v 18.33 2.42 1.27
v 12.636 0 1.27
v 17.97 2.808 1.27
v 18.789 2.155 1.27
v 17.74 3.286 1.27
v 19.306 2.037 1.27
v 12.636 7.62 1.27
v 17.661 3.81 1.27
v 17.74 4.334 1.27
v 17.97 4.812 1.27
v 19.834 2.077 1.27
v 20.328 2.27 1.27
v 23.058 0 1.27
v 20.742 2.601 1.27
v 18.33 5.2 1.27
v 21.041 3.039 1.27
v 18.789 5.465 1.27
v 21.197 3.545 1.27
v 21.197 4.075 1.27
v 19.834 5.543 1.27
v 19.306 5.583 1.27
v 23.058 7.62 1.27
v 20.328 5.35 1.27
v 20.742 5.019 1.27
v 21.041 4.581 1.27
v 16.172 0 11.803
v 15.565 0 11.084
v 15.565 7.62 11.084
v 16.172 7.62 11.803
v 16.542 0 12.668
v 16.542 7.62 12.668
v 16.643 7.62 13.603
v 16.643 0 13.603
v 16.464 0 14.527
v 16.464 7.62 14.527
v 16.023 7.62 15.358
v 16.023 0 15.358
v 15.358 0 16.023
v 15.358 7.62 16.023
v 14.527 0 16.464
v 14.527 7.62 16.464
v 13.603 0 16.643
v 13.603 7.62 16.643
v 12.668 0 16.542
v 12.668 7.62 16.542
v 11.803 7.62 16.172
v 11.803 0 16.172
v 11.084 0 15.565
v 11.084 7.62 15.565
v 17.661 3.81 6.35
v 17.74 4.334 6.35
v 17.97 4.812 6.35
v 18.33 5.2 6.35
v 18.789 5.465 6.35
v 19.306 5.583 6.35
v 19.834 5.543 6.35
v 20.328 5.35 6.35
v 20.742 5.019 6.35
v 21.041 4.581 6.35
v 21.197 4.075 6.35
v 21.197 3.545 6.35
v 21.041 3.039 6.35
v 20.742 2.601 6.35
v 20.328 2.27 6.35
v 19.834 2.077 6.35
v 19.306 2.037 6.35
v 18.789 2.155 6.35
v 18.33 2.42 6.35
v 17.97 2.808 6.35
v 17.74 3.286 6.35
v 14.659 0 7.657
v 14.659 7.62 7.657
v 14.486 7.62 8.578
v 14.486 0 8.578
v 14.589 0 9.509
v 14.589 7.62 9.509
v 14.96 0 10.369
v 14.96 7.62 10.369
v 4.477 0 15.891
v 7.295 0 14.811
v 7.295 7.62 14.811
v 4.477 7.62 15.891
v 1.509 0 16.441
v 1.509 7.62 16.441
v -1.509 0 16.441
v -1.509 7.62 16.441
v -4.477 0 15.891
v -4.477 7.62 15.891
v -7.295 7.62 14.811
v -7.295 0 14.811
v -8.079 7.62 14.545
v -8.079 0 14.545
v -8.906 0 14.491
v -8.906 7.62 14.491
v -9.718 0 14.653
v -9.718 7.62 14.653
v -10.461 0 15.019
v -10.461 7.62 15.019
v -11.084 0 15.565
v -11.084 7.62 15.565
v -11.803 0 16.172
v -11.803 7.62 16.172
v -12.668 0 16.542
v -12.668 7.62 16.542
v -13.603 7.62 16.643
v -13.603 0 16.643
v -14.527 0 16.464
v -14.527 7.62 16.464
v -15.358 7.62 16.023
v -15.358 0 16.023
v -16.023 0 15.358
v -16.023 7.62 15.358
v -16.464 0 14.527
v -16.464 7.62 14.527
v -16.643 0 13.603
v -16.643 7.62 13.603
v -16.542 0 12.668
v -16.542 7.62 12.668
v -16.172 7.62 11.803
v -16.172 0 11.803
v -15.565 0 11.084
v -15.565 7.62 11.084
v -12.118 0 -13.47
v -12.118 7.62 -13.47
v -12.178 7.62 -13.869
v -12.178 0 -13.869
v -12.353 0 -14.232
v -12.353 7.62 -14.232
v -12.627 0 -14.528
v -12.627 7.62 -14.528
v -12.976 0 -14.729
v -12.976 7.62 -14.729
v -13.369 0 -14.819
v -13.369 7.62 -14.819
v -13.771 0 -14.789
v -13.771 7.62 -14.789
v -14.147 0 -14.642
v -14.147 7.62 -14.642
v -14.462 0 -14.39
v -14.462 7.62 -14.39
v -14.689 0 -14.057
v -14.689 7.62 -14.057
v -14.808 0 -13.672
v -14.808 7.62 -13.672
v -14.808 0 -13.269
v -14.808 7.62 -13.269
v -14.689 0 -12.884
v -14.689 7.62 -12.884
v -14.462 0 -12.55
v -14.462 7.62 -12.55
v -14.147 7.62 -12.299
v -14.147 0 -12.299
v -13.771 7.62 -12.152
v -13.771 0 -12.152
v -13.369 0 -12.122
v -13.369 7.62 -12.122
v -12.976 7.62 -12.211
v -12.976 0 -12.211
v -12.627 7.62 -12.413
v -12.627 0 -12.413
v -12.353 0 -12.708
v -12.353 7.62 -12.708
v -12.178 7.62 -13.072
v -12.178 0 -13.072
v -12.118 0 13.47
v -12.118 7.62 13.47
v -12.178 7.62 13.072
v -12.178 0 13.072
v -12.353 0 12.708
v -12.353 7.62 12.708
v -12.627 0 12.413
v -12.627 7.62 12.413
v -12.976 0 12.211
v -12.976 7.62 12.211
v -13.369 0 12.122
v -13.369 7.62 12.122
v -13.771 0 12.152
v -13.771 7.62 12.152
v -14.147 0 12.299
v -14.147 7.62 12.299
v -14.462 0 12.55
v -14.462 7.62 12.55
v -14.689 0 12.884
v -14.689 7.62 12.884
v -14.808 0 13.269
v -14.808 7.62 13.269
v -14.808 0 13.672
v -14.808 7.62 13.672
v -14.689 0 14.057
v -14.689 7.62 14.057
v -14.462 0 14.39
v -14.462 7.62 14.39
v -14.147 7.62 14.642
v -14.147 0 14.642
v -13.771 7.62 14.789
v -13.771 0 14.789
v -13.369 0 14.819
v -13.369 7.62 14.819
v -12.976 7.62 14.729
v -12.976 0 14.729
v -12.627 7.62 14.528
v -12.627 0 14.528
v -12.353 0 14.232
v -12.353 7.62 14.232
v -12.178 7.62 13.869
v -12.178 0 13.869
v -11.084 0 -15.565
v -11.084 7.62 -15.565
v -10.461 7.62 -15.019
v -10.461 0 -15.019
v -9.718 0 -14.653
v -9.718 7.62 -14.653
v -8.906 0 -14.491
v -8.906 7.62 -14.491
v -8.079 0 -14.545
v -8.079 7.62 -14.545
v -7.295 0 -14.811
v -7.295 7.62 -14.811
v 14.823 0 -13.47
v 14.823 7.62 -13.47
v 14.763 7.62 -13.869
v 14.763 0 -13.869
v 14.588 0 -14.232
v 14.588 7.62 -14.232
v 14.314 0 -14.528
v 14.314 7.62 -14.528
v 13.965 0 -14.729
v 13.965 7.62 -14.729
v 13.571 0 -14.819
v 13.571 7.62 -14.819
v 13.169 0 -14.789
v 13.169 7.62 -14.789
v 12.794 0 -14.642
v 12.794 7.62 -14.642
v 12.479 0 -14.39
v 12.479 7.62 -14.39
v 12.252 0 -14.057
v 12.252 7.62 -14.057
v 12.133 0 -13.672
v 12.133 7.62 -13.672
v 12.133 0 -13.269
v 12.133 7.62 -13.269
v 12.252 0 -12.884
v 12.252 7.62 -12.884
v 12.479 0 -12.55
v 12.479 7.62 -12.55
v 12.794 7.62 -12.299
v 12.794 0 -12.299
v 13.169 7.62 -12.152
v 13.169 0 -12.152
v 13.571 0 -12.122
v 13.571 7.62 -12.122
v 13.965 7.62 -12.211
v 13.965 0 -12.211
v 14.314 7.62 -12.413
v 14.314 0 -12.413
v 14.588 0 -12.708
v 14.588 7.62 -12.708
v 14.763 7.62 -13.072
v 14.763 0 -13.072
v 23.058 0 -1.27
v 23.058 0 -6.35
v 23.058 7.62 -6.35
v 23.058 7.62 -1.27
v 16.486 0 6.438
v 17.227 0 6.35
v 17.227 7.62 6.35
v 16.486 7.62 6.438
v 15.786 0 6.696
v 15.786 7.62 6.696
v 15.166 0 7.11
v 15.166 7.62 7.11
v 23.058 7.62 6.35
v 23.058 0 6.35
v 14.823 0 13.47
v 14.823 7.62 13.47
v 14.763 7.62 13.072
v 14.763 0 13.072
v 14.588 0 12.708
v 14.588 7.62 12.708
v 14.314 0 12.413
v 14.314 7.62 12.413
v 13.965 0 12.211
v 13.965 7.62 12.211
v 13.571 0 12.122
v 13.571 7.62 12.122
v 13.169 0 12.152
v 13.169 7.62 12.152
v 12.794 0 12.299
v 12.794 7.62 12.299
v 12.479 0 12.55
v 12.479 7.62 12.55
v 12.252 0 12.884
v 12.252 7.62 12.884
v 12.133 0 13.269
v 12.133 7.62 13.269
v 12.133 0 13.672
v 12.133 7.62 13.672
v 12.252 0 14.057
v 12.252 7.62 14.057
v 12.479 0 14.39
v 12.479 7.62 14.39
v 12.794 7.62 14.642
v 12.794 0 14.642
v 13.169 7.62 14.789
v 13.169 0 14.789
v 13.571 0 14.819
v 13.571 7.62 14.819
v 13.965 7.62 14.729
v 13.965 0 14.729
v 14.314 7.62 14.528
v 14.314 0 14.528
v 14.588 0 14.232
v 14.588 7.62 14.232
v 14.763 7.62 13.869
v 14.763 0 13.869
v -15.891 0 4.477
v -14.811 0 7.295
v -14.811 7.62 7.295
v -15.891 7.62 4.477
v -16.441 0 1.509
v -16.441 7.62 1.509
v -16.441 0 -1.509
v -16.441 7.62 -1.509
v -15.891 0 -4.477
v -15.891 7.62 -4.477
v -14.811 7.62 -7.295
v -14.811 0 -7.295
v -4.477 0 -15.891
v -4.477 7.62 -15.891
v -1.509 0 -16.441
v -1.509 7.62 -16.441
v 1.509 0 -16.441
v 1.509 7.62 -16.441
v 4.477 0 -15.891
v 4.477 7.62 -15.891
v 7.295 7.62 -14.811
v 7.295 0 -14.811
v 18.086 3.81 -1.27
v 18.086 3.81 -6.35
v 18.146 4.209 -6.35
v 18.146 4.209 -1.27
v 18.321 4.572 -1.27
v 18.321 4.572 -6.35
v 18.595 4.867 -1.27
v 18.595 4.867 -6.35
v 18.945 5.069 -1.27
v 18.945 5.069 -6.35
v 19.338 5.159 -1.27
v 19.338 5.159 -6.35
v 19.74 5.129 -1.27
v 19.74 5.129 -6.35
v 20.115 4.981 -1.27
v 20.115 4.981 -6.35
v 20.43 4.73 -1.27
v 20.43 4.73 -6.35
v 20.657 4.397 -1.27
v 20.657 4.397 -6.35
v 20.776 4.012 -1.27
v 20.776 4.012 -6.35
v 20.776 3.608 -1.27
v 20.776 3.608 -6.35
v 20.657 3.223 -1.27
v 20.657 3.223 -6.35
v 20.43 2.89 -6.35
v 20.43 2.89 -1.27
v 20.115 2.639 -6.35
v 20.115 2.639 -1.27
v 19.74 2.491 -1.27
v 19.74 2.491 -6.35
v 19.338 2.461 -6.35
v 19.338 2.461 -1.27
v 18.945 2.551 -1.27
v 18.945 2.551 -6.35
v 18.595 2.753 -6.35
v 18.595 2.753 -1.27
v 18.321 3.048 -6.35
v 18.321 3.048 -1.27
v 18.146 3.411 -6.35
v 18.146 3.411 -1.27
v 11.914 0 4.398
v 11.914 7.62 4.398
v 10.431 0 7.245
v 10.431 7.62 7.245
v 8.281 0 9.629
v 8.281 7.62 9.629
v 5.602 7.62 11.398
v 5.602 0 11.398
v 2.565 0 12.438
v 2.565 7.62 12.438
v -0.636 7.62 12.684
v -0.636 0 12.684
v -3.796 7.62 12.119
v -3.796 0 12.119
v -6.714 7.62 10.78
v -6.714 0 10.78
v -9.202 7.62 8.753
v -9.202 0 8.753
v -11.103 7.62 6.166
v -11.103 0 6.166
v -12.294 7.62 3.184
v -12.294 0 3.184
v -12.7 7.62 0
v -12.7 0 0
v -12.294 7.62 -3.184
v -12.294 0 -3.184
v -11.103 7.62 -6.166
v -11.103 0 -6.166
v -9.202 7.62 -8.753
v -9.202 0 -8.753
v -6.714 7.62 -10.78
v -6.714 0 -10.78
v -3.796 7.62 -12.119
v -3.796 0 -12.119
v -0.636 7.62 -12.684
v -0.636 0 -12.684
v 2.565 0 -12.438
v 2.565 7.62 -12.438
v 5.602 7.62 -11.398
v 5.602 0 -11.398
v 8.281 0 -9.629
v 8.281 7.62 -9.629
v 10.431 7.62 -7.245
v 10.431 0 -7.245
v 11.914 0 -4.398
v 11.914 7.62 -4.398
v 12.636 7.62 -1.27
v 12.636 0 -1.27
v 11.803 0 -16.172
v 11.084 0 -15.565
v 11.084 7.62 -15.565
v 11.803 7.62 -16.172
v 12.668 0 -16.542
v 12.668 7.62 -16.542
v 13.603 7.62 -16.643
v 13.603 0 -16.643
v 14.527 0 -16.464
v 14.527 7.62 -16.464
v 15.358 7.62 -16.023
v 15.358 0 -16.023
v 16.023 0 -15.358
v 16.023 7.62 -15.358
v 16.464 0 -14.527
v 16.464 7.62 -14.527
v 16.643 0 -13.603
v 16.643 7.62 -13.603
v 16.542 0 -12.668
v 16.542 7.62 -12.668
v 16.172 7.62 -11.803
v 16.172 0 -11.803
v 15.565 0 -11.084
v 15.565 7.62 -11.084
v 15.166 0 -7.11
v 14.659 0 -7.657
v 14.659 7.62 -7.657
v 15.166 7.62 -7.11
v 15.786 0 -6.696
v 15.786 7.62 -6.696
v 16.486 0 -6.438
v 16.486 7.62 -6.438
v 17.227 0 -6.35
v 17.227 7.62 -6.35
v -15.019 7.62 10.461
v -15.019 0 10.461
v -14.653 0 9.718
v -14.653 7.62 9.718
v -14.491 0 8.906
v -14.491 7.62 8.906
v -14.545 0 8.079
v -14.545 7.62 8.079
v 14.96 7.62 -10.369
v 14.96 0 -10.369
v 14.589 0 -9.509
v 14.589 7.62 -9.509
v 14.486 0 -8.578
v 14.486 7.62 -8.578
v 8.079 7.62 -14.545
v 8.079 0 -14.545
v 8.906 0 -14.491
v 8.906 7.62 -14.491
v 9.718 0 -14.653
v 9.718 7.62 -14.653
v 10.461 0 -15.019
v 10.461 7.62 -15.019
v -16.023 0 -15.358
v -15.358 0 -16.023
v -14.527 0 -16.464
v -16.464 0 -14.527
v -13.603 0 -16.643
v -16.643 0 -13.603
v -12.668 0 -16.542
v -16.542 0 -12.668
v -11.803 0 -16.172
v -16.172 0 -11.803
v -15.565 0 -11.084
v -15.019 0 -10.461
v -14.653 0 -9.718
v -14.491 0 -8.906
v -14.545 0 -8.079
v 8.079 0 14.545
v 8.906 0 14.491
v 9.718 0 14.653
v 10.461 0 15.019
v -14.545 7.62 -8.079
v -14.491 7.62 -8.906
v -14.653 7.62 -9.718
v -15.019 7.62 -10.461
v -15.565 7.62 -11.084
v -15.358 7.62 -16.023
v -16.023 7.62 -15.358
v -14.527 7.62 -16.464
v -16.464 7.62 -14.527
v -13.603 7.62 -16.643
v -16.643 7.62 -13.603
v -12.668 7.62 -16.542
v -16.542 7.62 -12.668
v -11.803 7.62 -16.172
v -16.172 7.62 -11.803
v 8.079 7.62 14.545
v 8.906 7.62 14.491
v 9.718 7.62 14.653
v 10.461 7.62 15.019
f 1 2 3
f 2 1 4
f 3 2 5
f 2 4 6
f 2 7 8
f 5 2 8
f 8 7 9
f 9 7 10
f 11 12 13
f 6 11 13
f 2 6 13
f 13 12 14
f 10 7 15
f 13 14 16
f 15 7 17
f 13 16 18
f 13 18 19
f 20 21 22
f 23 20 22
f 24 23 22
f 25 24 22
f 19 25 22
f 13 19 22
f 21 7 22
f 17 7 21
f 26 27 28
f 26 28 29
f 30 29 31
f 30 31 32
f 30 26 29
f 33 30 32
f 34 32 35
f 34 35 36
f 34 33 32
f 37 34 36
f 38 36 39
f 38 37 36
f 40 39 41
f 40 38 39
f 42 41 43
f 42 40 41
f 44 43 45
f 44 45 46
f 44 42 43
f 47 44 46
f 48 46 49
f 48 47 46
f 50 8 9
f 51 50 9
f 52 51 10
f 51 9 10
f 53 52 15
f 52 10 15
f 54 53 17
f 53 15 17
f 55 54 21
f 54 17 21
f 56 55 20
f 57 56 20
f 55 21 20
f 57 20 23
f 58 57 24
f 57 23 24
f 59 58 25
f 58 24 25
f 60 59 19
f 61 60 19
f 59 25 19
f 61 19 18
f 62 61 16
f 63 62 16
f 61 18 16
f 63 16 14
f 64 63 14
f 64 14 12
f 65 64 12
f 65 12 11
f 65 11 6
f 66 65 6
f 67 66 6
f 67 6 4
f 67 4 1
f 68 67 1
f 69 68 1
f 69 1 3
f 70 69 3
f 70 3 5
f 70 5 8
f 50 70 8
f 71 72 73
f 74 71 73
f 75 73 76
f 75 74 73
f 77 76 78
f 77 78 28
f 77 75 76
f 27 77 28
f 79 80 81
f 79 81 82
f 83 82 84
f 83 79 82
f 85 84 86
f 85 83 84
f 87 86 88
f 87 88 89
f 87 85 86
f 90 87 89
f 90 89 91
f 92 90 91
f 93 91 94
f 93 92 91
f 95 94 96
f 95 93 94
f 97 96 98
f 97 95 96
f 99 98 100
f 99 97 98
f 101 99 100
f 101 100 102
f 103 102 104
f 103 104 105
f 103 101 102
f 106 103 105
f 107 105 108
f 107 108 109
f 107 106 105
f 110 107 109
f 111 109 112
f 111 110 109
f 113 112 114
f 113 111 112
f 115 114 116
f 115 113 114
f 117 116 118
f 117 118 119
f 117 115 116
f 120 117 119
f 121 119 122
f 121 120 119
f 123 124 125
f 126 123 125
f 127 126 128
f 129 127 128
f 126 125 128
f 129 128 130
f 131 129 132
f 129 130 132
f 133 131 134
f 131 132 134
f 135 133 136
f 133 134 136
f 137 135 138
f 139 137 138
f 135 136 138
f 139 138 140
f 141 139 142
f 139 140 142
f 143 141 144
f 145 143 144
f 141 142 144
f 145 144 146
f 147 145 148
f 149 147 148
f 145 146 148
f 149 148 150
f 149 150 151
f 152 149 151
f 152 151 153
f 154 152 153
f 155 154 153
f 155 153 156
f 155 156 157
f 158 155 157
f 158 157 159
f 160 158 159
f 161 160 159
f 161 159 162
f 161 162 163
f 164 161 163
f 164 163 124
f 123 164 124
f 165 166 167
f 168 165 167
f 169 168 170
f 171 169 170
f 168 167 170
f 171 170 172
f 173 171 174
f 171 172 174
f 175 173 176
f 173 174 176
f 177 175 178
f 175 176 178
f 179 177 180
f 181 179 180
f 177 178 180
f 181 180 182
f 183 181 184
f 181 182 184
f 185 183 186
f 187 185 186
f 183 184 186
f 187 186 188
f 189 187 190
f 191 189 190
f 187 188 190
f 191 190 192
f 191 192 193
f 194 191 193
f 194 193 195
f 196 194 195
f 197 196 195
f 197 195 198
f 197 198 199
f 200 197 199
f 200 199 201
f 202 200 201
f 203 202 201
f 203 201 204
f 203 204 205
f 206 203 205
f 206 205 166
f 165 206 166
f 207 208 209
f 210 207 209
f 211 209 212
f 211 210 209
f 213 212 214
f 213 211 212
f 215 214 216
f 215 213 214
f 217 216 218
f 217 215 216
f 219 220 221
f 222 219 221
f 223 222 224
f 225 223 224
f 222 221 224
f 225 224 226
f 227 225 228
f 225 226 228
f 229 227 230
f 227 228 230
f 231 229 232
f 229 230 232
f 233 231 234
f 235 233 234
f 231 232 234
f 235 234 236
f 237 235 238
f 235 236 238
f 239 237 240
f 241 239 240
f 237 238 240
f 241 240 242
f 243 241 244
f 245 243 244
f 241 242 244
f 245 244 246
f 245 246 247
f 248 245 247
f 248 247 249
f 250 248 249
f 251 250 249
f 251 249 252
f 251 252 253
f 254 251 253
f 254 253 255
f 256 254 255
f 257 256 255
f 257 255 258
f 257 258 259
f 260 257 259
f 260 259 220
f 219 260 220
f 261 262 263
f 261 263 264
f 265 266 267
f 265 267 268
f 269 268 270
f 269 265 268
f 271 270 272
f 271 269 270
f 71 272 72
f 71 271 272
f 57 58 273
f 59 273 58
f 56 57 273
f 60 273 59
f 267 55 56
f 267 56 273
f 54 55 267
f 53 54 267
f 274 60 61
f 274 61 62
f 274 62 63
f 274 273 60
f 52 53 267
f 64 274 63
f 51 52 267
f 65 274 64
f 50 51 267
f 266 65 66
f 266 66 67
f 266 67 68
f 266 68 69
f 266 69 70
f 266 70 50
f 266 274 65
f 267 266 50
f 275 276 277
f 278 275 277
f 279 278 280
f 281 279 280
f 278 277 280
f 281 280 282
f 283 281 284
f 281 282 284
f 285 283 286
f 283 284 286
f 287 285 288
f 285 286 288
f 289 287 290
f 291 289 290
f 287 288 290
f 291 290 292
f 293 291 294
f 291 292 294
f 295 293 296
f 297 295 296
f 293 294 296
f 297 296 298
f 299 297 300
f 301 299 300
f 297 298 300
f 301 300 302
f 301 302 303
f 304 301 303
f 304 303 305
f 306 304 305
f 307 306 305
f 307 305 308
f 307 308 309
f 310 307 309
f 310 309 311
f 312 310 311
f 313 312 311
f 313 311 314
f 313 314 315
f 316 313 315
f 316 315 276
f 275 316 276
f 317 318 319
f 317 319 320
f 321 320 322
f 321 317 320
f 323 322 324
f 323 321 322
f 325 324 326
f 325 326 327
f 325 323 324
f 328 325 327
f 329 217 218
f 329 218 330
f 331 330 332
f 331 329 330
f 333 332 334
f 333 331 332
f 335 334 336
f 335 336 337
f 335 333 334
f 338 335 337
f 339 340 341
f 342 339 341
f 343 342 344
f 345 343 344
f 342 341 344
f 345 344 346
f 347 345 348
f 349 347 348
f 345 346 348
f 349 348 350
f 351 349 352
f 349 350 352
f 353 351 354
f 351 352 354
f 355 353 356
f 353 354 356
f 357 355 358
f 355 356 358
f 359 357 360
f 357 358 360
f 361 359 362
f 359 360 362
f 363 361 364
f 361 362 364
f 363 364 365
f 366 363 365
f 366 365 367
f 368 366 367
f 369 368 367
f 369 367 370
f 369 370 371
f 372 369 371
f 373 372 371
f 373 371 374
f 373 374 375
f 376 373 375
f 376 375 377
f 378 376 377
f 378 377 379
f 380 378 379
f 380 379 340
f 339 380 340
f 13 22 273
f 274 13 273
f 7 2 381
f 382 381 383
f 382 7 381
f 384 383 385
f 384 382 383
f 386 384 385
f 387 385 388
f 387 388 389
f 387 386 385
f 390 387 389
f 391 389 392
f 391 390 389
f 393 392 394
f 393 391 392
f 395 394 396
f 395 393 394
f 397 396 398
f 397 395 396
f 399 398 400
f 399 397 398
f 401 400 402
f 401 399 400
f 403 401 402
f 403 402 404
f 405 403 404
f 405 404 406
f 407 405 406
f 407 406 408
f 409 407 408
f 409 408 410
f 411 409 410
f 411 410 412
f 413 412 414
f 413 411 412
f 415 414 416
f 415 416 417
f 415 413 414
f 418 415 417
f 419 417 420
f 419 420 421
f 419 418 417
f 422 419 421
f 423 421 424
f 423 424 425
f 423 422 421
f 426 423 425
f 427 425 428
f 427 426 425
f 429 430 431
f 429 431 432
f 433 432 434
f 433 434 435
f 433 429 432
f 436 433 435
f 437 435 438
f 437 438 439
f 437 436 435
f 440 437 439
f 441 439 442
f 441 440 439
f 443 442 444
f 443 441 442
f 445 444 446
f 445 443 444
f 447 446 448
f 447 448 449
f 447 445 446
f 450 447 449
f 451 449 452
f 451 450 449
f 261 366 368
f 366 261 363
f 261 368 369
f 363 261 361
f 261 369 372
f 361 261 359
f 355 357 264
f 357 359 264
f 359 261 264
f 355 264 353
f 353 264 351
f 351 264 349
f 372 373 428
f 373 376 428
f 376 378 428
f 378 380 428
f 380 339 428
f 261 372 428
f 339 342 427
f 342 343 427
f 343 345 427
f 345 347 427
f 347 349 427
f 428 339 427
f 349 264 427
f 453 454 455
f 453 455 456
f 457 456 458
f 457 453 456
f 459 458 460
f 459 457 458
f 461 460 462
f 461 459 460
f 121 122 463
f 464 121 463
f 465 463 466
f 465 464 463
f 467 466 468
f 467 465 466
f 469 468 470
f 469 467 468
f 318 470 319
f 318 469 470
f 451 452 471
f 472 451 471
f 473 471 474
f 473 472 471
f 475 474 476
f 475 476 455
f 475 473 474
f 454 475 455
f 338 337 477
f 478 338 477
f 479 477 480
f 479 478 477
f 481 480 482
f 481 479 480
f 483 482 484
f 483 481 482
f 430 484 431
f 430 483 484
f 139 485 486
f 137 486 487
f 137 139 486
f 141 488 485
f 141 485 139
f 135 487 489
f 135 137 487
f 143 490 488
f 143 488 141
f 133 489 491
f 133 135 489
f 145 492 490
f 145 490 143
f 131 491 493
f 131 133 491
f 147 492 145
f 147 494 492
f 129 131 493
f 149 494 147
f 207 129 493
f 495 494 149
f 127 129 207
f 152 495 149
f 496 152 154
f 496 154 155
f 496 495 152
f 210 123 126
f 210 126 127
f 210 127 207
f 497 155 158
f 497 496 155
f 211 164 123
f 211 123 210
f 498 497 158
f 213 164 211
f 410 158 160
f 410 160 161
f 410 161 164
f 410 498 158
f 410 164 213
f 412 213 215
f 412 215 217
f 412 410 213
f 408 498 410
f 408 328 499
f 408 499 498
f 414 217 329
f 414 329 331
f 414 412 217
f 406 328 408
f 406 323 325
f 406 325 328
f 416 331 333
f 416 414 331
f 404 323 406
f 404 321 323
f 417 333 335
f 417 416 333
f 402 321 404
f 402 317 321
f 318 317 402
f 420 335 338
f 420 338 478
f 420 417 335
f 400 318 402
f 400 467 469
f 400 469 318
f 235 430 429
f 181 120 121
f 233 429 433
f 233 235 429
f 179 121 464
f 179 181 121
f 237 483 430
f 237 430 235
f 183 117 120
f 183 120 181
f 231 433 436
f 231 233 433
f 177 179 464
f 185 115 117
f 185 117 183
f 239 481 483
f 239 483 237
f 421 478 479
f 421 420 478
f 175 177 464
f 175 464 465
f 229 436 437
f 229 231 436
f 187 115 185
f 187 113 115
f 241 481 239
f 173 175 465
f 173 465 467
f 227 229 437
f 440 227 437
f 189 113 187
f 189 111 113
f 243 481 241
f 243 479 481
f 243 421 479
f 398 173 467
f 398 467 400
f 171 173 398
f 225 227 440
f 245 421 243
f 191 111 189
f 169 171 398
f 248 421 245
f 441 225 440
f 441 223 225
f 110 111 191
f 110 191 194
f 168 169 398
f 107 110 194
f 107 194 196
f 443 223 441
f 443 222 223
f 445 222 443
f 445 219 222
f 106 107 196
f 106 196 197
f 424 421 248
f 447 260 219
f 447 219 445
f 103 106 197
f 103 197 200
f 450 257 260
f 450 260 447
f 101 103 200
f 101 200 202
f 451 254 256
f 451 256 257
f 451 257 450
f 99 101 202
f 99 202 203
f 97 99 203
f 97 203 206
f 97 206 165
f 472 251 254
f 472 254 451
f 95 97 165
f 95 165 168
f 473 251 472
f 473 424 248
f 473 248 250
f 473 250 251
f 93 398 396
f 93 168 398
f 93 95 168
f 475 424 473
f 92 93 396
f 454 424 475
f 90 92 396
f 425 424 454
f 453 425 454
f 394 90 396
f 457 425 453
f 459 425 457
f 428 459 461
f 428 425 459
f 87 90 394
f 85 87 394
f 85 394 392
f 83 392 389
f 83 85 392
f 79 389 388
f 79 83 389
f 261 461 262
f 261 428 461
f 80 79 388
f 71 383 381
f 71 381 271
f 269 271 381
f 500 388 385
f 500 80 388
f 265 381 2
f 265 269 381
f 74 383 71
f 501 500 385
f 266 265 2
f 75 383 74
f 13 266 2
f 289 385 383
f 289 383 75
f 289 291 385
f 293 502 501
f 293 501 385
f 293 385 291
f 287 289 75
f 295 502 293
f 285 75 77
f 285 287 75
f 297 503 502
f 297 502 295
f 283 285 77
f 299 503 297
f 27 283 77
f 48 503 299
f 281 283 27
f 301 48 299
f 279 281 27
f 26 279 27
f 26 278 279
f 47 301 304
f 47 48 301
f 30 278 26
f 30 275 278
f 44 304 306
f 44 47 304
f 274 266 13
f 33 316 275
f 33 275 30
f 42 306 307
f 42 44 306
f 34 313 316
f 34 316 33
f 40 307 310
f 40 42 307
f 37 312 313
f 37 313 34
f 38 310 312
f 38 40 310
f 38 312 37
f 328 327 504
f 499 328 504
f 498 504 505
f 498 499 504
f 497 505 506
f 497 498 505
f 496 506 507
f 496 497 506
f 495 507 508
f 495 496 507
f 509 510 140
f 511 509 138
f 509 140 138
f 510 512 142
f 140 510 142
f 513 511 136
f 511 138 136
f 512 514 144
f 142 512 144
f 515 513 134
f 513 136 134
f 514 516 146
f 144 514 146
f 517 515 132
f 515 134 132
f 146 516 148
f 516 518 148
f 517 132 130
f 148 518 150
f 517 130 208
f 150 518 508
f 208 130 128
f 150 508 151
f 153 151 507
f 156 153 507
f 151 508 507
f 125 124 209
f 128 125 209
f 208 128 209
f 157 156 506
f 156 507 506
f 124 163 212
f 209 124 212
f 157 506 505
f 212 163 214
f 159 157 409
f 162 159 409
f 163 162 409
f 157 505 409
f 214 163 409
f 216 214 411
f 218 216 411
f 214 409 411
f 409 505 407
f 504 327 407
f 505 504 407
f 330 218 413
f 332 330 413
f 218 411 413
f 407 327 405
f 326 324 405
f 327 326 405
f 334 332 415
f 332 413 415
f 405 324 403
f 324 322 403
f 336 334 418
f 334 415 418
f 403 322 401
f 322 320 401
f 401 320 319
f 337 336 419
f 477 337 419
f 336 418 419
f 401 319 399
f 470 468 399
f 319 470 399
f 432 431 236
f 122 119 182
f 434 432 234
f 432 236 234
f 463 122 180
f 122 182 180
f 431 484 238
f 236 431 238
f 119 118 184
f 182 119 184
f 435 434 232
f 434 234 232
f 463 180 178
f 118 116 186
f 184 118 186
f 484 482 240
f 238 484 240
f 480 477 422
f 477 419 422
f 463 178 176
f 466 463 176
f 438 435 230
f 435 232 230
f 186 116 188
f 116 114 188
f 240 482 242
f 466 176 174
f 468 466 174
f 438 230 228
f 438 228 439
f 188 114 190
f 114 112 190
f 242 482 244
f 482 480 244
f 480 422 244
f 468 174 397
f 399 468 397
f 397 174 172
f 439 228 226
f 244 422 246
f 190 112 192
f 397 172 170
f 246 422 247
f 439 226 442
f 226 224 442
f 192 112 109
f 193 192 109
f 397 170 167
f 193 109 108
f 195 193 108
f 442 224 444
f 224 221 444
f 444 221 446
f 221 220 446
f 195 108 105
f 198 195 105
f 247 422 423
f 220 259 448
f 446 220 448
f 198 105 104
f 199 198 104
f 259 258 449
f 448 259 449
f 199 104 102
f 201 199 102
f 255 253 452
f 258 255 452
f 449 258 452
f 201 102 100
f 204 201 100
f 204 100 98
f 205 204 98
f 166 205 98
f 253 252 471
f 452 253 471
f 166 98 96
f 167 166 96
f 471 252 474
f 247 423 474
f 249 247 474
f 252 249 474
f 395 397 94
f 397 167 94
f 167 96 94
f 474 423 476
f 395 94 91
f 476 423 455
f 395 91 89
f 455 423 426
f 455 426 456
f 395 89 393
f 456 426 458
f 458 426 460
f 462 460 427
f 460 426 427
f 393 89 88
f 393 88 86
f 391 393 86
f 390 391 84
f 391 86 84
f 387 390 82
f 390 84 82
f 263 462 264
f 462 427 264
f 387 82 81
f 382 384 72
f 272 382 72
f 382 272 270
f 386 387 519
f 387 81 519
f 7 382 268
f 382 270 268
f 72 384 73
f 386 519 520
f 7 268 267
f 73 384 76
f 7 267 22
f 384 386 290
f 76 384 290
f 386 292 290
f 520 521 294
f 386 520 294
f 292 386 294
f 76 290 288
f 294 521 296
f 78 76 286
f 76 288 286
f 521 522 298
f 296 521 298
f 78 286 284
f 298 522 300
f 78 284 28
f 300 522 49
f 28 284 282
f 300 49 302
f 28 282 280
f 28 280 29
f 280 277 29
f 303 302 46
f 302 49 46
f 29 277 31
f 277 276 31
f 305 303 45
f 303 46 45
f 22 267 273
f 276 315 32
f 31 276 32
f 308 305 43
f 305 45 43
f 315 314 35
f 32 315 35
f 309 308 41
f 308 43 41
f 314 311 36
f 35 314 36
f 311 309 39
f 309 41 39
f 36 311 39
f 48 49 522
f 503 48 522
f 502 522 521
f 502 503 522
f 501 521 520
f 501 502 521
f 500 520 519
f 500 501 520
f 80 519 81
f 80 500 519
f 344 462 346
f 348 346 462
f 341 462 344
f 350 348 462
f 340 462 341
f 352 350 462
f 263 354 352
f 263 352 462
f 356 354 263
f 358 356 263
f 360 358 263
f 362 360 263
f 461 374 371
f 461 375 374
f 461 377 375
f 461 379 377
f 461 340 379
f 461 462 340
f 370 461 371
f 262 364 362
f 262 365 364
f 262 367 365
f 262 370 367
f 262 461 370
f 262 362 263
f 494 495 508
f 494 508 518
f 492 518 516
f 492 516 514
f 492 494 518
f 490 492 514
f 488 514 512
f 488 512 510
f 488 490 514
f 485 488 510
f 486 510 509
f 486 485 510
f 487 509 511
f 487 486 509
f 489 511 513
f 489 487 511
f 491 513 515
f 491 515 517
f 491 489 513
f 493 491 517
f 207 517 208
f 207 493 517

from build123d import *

# Parameters (mm, degrees)
BOSS_EXTRUDE1_DEPTH        = 7.62
CUT_EXTRUDE1_DEPTH         = 30.441514138
SKETCH3_W                  = 12.7
SKETCH3_H                  = 7.62
M2_5_CLEARANCE_HOLE1_D     = 2.7051
M3_CLEARANCE_HOLE1_D       = 3.556
M3_CLEARANCE_HOLE1_DEPTH   = 5.08
M2_5_CLEARANCE_HOLE2_D     = 2.7051
M2_5_CLEARANCE_HOLE2_DEPTH = 15.375384182


with BuildPart() as part:
    # Sketch1 → Boss-Extrude1 (new body)
    with BuildSketch(Plane.XZ):
        with BuildLine():
            Line((17.227118157, -6.35), (23.057960451, -6.35))
            Line((23.057960451, -6.35), (23.057960451, 6.35))
            Line((23.057960451, 6.35), (17.227118157, 6.35))
            ThreePointArc((17.227118157, 6.35), (15.786457002, 6.695667846), (14.659490486, 7.657404449))
            ThreePointArc((14.659490486, 7.657404449), (14.589471792, 9.508848608), (15.564771332, 11.084138707))
            ThreePointArc((15.564771332, 11.084138707), (15.715448212, 15.715448212), (11.084138707, 15.564771332))
            ThreePointArc((11.084138707, 15.564771332), (9.317430783, 14.545190239), (7.295007228, 14.810907114))
            ThreePointArc((7.295007228, 14.810907114), (0, 16.51), (-7.295007228, 14.810907114))
            ThreePointArc((-7.295007228, 14.810907114), (-9.317430783, 14.545190239), (-11.084138707, 15.564771332))
            ThreePointArc((-11.084138707, 15.564771332), (-15.715448212, 15.715448212), (-15.564771332, 11.084138707))
            ThreePointArc((-15.564771332, 11.084138707), (-14.545190239, 9.317430783), (-14.810907114, 7.295007228))
            ThreePointArc((-14.810907114, 7.295007228), (-16.51, 0), (-14.810907114, -7.295007228))
            ThreePointArc((-14.810907114, -7.295007228), (-14.545190239, -9.317430783), (-15.564771332, -11.084138707))
            ThreePointArc((-15.564771332, -11.084138707), (-15.715448212, -15.715448212), (-11.084138707, -15.564771332))
            ThreePointArc((-11.084138707, -15.564771332), (-9.317430783, -14.545190239), (-7.295007228, -14.810907114))
            ThreePointArc((-7.295007228, -14.810907114), (0, -16.51), (7.295007228, -14.810907114))
            ThreePointArc((7.295007228, -14.810907114), (9.317430783, -14.545190239), (11.084138707, -15.564771332))
            ThreePointArc((11.084138707, -15.564771332), (15.715448212, -15.715448212), (15.564771332, -11.084138707))
            ThreePointArc((15.564771332, -11.084138707), (14.589471792, -9.508848608), (14.659490486, -7.657404449))
            ThreePointArc((14.659490486, -7.657404449), (15.786457002, -6.695667846), (17.227118157, -6.35))
        make_face()
    extrude(amount=-BOSS_EXTRUDE1_DEPTH)

    # Sketch2 → Cut-Extrude1 (cut, through all)
    with BuildSketch(Plane(origin=(0, 7.62, 0), x_dir=(-1, 0, 0), z_dir=(0, 1, 0))):
        with BuildLine():
            Line((-23.057960451, 1.27), (-23.057960451, -1.27))
            Line((-23.057960451, -1.27), (-12.636340451, -1.27))
            ThreePointArc((-12.636340451, -1.27), (-12.7, 0), (-12.636340451, 1.27))
            Line((-12.636340451, 1.27), (-23.057960451, 1.27))
        make_face()
    extrude(amount=-CUT_EXTRUDE1_DEPTH, mode=Mode.SUBTRACT)

    # Sketch3 → Cut-Revolve1 (revolve, cut)
    with BuildSketch(Plane.XY):
        with Locations((6.35, 3.81)):
            Rectangle(SKETCH3_W, SKETCH3_H)
    revolve(axis=Axis((0, 7.62, 0), (0, -1, 0)), mode=Mode.SUBTRACT)

    # M2.5 Clearance Hole1 (through all)
    with Locations(Plane(origin=(0, 0, 0), x_dir=(-1, 0, 0), z_dir=(0, -1, 0))):
        with Locations((-13.470384182, -13.470384182), (13.470384182, -13.470384182), (13.470384182, 13.470384182), (-13.470384182, 13.470384182)):
            Hole(M2_5_CLEARANCE_HOLE1_D / 2)

    # M3 Clearance Hole1
    with Locations(Plane.XY.offset(6.35)):
        with Locations((19.438793191, 3.81)):
            Hole(M3_CLEARANCE_HOLE1_D / 2, depth=M3_CLEARANCE_HOLE1_DEPTH)

    # M2.5 Clearance Hole2
    with Locations(Plane.XY.offset(-1.27)):
        with Locations((19.438793191, 3.81)):
            Hole(M2_5_CLEARANCE_HOLE2_D / 2, depth=M2_5_CLEARANCE_HOLE2_DEPTH)


solid = part.part
